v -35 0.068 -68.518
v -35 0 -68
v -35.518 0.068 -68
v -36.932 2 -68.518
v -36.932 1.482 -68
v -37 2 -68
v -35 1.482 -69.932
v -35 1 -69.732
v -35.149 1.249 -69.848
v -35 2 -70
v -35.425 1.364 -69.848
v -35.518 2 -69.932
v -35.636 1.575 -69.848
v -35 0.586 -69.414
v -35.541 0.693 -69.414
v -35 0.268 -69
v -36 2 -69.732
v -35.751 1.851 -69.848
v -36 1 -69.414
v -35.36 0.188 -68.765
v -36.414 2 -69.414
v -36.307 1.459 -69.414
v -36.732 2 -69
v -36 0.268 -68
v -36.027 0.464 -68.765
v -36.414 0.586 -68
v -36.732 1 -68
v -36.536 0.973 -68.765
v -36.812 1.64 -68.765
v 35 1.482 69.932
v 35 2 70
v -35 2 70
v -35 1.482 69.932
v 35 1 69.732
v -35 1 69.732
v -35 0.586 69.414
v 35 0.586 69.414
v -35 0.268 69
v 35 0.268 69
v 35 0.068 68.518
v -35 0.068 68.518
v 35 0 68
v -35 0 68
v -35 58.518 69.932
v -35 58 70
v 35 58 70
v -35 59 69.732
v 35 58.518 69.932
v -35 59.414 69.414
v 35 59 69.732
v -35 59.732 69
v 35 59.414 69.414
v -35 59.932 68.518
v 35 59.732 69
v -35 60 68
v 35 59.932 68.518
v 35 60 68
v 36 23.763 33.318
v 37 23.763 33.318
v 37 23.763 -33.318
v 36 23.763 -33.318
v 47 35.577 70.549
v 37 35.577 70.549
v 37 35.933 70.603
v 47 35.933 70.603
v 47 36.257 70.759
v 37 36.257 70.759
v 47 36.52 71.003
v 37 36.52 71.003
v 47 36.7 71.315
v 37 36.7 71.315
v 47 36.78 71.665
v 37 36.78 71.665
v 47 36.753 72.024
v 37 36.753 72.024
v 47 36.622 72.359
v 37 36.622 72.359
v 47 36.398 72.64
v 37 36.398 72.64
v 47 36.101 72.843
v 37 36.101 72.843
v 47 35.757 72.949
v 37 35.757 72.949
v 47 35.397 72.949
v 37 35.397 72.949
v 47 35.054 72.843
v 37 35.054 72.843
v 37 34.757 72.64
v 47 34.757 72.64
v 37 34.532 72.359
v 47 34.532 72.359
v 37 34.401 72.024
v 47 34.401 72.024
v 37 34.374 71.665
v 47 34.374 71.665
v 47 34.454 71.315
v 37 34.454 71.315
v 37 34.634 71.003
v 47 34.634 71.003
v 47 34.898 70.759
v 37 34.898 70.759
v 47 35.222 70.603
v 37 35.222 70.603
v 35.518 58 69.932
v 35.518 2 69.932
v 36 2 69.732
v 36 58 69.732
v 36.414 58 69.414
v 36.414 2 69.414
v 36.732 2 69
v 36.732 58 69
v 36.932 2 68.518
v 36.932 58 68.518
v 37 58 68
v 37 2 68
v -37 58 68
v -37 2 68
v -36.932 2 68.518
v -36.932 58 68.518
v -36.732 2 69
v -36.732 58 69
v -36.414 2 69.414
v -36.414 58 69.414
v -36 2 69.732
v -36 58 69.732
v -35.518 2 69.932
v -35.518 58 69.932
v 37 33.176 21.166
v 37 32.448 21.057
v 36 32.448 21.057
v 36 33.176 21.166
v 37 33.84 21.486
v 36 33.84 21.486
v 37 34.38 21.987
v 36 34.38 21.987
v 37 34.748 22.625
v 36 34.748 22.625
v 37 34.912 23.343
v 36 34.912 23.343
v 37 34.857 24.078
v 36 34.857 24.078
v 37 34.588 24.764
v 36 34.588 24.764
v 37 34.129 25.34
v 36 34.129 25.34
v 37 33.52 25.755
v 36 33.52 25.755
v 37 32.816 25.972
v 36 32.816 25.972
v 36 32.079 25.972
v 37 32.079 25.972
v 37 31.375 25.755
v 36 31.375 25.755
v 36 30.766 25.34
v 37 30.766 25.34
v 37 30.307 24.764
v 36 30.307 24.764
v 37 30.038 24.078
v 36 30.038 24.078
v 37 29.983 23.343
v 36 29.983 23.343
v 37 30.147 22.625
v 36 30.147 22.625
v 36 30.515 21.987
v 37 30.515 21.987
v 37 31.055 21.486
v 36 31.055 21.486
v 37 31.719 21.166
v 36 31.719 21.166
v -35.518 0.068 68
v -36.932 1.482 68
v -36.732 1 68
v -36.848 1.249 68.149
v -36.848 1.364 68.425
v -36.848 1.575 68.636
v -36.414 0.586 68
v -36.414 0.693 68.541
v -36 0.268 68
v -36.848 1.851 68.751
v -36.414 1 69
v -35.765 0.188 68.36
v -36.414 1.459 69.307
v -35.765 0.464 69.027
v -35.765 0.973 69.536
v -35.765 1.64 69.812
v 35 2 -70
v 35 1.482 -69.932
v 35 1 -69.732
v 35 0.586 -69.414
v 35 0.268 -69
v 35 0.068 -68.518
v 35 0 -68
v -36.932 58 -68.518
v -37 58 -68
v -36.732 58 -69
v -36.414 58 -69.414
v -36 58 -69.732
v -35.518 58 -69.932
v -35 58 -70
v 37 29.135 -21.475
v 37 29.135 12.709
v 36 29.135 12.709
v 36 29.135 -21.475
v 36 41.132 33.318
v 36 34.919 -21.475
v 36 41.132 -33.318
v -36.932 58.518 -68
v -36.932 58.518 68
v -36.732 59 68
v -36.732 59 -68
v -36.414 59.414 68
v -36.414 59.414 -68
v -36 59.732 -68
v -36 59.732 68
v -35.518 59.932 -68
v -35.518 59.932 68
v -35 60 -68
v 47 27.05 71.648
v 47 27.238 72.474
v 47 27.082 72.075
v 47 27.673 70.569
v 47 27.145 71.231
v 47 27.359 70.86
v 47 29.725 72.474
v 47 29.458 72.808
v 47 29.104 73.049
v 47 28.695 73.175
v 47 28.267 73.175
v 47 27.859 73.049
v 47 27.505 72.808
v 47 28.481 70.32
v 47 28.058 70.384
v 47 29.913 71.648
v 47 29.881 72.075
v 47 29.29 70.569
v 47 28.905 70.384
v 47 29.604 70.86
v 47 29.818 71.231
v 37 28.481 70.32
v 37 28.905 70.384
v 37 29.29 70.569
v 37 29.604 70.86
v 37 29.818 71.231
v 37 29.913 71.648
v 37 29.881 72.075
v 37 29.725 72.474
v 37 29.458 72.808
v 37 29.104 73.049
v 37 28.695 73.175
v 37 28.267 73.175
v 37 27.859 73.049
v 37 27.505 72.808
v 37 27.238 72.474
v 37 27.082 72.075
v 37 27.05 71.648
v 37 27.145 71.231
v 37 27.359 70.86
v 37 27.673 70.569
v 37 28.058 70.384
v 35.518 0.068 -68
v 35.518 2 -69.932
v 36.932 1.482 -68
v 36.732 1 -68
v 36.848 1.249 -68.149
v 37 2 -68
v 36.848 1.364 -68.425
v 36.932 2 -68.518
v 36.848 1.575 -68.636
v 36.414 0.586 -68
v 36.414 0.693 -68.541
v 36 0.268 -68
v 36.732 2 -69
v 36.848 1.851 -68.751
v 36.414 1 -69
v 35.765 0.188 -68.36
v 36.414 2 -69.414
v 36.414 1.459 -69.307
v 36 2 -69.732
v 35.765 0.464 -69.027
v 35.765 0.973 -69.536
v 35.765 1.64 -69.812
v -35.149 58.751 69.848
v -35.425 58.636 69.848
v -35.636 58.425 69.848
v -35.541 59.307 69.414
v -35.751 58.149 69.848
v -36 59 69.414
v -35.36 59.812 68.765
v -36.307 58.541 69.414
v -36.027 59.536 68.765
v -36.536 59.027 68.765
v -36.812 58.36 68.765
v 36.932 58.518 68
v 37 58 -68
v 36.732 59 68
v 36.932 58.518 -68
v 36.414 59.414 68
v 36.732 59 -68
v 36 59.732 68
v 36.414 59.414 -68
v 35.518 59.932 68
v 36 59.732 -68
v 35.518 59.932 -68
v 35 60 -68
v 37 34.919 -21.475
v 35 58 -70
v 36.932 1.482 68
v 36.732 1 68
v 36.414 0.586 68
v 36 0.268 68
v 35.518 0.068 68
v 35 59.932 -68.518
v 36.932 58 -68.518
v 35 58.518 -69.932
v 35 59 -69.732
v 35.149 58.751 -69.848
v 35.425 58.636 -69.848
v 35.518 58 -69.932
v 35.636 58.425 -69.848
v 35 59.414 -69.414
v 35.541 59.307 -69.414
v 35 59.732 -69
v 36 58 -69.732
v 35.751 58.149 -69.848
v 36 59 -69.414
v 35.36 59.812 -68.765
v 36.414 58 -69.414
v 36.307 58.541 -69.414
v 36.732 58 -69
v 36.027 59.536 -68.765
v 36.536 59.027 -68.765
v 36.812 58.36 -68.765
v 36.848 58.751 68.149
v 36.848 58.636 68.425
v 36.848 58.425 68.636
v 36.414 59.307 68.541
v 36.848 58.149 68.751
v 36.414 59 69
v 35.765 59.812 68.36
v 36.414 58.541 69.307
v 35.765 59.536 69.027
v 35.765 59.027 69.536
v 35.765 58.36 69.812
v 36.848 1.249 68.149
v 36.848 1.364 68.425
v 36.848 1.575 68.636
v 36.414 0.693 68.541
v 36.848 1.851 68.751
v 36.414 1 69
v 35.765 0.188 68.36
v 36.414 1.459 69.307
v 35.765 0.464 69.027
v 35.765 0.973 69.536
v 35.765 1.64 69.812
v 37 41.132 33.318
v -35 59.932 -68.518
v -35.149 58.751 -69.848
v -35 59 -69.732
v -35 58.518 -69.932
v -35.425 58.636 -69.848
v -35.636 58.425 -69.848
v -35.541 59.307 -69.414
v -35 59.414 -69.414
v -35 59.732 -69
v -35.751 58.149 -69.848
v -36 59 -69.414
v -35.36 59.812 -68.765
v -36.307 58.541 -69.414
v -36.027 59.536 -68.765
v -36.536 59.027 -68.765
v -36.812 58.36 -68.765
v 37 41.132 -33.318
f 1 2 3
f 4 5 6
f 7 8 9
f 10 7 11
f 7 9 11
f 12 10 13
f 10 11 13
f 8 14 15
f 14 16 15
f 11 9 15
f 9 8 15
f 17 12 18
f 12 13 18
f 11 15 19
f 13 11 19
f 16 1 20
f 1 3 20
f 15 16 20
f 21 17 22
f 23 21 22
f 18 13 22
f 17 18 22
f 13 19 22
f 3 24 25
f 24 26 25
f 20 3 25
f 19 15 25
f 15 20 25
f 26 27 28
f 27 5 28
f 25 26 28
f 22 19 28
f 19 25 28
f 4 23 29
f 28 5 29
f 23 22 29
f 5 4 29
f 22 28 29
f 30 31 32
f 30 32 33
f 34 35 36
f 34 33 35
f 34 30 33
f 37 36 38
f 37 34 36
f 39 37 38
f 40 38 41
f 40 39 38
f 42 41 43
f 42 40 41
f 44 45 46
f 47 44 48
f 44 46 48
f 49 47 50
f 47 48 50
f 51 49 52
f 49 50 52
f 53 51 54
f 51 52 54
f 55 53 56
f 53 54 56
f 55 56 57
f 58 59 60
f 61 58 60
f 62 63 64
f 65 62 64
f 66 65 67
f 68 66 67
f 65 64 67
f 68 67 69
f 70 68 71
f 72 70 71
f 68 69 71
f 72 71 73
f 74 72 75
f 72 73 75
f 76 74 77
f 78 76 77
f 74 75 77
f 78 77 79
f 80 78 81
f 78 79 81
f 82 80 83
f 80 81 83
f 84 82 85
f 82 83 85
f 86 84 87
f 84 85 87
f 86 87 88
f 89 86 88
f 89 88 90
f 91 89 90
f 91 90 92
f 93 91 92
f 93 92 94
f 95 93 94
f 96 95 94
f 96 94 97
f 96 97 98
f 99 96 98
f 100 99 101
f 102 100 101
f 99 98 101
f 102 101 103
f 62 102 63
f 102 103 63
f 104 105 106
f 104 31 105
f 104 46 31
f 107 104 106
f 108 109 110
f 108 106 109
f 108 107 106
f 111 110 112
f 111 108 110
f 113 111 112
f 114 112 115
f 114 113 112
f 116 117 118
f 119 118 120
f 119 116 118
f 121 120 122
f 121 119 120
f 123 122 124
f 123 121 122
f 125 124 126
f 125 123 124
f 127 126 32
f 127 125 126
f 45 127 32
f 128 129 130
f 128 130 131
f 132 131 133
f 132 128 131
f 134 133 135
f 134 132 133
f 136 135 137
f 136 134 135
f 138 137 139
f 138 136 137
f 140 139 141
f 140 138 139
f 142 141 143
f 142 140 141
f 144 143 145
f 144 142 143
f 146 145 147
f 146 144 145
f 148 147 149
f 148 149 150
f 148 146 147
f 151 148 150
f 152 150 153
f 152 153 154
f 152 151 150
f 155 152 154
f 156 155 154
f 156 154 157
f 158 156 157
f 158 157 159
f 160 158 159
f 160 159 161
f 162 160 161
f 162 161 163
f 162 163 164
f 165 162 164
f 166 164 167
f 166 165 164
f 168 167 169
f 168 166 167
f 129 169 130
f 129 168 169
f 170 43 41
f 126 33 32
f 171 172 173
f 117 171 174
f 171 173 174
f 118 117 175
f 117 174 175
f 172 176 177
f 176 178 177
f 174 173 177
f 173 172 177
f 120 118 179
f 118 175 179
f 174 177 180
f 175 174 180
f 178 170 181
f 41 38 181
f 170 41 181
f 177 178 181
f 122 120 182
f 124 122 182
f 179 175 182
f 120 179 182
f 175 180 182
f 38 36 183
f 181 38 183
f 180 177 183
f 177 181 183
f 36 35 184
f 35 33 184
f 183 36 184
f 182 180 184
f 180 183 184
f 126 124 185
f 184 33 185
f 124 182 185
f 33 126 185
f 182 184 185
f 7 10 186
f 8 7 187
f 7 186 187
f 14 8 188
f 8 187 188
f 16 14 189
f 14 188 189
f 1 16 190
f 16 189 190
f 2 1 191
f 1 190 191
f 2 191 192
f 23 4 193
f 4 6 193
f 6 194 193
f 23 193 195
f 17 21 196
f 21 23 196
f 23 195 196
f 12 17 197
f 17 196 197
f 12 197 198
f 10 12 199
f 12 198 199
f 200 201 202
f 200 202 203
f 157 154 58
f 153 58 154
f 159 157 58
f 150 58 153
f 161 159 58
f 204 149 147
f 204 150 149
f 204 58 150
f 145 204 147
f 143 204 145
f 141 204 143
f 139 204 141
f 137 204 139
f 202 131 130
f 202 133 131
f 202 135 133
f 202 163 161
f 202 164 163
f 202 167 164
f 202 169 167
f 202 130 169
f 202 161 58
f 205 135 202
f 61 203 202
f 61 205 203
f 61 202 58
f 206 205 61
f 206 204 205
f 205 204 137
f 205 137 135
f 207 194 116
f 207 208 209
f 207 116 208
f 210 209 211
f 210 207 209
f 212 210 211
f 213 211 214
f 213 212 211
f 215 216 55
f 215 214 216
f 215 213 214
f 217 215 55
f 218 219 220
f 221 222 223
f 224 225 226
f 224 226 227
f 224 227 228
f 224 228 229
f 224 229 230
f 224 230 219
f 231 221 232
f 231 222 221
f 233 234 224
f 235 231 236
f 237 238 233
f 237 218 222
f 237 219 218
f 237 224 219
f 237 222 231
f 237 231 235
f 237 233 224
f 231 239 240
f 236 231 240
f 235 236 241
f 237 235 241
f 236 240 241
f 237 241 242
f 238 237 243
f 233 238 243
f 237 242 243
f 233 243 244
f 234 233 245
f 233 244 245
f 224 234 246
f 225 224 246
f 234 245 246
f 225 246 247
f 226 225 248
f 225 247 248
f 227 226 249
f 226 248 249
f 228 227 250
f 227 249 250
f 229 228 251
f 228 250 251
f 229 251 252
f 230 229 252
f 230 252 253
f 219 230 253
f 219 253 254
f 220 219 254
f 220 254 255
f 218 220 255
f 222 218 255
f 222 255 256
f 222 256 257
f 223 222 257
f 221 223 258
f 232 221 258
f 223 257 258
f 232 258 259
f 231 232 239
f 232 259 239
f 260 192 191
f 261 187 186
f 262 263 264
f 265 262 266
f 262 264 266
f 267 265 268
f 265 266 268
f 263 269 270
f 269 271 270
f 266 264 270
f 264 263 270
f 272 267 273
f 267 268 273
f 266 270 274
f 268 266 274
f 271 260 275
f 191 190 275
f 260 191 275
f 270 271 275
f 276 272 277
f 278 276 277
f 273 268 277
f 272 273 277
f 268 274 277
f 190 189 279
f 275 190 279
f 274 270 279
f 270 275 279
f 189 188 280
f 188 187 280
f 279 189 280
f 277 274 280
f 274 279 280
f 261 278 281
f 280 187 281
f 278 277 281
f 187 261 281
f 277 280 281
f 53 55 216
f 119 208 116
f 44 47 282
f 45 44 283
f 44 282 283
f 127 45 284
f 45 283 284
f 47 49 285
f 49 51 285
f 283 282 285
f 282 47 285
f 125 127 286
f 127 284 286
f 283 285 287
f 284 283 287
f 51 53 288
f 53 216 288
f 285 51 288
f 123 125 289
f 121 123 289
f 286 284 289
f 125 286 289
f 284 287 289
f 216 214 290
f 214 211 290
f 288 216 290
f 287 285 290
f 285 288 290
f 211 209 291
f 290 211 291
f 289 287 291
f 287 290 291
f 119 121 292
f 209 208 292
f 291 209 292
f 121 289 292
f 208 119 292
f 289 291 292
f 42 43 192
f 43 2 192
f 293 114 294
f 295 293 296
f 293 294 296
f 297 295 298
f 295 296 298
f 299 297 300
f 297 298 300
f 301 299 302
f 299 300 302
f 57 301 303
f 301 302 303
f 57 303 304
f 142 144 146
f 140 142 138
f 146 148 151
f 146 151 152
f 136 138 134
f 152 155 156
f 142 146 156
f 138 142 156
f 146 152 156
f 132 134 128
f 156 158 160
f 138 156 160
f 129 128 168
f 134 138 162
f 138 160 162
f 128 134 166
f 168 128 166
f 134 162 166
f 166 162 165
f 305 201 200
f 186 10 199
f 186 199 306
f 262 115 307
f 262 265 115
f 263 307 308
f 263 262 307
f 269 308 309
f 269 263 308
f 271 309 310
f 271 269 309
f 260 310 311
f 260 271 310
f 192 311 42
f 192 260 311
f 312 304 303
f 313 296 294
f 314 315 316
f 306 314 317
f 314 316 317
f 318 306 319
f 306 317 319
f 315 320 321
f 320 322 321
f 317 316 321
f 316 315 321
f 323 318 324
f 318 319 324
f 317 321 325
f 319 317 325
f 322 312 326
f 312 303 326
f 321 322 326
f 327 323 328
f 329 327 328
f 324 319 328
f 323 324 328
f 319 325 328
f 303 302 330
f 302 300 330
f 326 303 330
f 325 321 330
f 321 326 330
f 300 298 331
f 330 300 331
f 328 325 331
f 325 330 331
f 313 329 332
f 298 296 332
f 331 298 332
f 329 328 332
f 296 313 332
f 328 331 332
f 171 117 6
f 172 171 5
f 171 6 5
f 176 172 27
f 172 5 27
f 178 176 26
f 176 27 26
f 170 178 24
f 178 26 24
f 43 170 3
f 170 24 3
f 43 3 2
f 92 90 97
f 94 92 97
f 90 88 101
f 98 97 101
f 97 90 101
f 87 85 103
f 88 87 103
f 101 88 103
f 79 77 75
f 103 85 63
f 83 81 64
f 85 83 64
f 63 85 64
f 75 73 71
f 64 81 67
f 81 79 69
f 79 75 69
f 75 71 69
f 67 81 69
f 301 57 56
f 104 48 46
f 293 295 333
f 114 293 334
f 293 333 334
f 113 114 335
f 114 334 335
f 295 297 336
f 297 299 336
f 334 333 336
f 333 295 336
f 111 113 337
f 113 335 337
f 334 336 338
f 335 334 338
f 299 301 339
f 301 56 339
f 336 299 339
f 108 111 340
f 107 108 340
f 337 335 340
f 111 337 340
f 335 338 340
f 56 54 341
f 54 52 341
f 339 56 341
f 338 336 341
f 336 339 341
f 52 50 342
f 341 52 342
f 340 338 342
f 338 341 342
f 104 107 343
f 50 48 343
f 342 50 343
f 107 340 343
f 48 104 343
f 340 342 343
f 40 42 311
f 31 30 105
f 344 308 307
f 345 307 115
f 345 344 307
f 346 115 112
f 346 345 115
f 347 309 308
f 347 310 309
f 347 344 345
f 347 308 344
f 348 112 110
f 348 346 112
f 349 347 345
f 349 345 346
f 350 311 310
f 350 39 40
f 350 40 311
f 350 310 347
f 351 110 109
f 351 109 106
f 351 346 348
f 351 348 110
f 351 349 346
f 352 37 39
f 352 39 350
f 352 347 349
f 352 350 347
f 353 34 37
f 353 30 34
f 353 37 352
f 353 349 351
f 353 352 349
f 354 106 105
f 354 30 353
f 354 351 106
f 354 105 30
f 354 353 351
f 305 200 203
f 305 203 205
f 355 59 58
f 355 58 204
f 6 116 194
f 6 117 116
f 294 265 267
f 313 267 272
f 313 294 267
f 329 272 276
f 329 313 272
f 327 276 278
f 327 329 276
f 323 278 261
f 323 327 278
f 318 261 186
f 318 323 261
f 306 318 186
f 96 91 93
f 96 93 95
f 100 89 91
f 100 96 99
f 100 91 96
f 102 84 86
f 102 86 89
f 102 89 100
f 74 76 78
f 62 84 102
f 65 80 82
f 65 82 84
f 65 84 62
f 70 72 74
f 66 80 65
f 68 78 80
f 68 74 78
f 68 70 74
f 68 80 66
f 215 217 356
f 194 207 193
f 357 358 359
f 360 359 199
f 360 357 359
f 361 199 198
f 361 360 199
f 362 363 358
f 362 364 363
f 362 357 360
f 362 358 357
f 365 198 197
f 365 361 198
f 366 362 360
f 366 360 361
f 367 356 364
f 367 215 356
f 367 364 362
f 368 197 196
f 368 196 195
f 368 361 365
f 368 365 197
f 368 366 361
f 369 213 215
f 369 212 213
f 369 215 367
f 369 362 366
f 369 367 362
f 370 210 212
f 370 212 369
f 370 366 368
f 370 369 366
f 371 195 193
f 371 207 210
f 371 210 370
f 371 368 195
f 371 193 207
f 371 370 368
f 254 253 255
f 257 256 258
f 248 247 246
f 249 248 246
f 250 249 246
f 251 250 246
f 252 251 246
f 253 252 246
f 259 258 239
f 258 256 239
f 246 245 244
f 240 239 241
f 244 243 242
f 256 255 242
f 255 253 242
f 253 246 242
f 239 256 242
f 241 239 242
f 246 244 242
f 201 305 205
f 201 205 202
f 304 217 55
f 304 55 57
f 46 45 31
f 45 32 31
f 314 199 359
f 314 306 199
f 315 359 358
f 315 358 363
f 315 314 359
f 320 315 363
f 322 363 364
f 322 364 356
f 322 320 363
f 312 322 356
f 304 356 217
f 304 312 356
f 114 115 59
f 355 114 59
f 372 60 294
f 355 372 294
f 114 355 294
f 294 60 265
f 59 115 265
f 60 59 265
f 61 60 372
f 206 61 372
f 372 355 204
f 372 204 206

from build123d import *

# Parameters (mm, degrees)
SKETCH_1_W          = 74
SKETCH_1_H          = 140
EXTRUDE_1_DEPTH     = 60
FILLET_1_R          = 2
SKETCH_2_W          = 66.636795908
SKETCH_2_H          = 17.369780924
SKETCH_2_R          = 2.471637057
CUT_EXTRUDE_1_DEPTH = 1
SKETCH_3_R          = 1.206421208
EXTRUDE_2_DEPTH     = 10
SKETCH_3_R_2        = 1.435732572
EXTRUDE_2_2_DEPTH   = 10


with BuildPart() as part:
    # 草图1 → 凸台-拉伸1 (new body)
    with BuildSketch(Plane(origin=(0, 0, 0), x_dir=(1, 0, 0), z_dir=(0, 1, 0))):
        Rectangle(SKETCH_1_W, SKETCH_1_H)
    extrude(amount=EXTRUDE_1_DEPTH)

    # 圆角1
    fillet_1_edges = [part.edges().sort_by_distance(p)[0] for p in [
        (-37, 60, 0),
        (0, 60, 70),
        (37, 60, 0),
        (0, 0, 70),
        (-37, 0, 0),
        (0, 0, -70),
        (37, 0, 0),
        (0, 60, -70),
        (37, 30, 70),
        (-37, 30, 70),
        (-37, 30, -70),
        (37, 30, -70),
    ]]
    fillet(fillet_1_edges, radius=FILLET_1_R)

    # 草图2 → 切除-拉伸1 (cut)
    with BuildSketch(Plane(origin=(37, 0, 0), x_dir=(0, 0, -1), z_dir=(1, 0, 0))):
        with Locations((0, 32.447560039)):
            Rectangle(SKETCH_2_W, SKETCH_2_H)
        with Locations((-23.528157797, 32.447560039)):
            Circle(SKETCH_2_R, mode=Mode.SUBTRACT)
        Polygon((-12.709007388, 29.134785602), (21.475365506, 29.134785602), (21.475365506, 34.919197096), align=None, mode=Mode.SUBTRACT)
    extrude(amount=-CUT_EXTRUDE_1_DEPTH, mode=Mode.SUBTRACT)


with BuildPart() as body_2:
    # 草图3 → 凸台-拉伸2 (new body)
    with BuildSketch(Plane(origin=(37, 0, 0), x_dir=(0, 0, -1), z_dir=(1, 0, 0))):
        with Locations((-71.755652282, 35.577224789)):
            Circle(SKETCH_3_R)
    extrude(amount=EXTRUDE_2_DEPTH)


with BuildPart() as body_3:
    # 草图3 → Extrude 2 2 (new body)
    with BuildSketch(Plane(origin=(37, 0, 0), x_dir=(0, 0, -1), z_dir=(1, 0, 0))):
        with Locations((-71.755652282, 28.481459221)):
            Circle(SKETCH_3_R_2)
    extrude(amount=EXTRUDE_2_2_DEPTH)


solid = Compound([part.part, body_2.part, body_3.part])
